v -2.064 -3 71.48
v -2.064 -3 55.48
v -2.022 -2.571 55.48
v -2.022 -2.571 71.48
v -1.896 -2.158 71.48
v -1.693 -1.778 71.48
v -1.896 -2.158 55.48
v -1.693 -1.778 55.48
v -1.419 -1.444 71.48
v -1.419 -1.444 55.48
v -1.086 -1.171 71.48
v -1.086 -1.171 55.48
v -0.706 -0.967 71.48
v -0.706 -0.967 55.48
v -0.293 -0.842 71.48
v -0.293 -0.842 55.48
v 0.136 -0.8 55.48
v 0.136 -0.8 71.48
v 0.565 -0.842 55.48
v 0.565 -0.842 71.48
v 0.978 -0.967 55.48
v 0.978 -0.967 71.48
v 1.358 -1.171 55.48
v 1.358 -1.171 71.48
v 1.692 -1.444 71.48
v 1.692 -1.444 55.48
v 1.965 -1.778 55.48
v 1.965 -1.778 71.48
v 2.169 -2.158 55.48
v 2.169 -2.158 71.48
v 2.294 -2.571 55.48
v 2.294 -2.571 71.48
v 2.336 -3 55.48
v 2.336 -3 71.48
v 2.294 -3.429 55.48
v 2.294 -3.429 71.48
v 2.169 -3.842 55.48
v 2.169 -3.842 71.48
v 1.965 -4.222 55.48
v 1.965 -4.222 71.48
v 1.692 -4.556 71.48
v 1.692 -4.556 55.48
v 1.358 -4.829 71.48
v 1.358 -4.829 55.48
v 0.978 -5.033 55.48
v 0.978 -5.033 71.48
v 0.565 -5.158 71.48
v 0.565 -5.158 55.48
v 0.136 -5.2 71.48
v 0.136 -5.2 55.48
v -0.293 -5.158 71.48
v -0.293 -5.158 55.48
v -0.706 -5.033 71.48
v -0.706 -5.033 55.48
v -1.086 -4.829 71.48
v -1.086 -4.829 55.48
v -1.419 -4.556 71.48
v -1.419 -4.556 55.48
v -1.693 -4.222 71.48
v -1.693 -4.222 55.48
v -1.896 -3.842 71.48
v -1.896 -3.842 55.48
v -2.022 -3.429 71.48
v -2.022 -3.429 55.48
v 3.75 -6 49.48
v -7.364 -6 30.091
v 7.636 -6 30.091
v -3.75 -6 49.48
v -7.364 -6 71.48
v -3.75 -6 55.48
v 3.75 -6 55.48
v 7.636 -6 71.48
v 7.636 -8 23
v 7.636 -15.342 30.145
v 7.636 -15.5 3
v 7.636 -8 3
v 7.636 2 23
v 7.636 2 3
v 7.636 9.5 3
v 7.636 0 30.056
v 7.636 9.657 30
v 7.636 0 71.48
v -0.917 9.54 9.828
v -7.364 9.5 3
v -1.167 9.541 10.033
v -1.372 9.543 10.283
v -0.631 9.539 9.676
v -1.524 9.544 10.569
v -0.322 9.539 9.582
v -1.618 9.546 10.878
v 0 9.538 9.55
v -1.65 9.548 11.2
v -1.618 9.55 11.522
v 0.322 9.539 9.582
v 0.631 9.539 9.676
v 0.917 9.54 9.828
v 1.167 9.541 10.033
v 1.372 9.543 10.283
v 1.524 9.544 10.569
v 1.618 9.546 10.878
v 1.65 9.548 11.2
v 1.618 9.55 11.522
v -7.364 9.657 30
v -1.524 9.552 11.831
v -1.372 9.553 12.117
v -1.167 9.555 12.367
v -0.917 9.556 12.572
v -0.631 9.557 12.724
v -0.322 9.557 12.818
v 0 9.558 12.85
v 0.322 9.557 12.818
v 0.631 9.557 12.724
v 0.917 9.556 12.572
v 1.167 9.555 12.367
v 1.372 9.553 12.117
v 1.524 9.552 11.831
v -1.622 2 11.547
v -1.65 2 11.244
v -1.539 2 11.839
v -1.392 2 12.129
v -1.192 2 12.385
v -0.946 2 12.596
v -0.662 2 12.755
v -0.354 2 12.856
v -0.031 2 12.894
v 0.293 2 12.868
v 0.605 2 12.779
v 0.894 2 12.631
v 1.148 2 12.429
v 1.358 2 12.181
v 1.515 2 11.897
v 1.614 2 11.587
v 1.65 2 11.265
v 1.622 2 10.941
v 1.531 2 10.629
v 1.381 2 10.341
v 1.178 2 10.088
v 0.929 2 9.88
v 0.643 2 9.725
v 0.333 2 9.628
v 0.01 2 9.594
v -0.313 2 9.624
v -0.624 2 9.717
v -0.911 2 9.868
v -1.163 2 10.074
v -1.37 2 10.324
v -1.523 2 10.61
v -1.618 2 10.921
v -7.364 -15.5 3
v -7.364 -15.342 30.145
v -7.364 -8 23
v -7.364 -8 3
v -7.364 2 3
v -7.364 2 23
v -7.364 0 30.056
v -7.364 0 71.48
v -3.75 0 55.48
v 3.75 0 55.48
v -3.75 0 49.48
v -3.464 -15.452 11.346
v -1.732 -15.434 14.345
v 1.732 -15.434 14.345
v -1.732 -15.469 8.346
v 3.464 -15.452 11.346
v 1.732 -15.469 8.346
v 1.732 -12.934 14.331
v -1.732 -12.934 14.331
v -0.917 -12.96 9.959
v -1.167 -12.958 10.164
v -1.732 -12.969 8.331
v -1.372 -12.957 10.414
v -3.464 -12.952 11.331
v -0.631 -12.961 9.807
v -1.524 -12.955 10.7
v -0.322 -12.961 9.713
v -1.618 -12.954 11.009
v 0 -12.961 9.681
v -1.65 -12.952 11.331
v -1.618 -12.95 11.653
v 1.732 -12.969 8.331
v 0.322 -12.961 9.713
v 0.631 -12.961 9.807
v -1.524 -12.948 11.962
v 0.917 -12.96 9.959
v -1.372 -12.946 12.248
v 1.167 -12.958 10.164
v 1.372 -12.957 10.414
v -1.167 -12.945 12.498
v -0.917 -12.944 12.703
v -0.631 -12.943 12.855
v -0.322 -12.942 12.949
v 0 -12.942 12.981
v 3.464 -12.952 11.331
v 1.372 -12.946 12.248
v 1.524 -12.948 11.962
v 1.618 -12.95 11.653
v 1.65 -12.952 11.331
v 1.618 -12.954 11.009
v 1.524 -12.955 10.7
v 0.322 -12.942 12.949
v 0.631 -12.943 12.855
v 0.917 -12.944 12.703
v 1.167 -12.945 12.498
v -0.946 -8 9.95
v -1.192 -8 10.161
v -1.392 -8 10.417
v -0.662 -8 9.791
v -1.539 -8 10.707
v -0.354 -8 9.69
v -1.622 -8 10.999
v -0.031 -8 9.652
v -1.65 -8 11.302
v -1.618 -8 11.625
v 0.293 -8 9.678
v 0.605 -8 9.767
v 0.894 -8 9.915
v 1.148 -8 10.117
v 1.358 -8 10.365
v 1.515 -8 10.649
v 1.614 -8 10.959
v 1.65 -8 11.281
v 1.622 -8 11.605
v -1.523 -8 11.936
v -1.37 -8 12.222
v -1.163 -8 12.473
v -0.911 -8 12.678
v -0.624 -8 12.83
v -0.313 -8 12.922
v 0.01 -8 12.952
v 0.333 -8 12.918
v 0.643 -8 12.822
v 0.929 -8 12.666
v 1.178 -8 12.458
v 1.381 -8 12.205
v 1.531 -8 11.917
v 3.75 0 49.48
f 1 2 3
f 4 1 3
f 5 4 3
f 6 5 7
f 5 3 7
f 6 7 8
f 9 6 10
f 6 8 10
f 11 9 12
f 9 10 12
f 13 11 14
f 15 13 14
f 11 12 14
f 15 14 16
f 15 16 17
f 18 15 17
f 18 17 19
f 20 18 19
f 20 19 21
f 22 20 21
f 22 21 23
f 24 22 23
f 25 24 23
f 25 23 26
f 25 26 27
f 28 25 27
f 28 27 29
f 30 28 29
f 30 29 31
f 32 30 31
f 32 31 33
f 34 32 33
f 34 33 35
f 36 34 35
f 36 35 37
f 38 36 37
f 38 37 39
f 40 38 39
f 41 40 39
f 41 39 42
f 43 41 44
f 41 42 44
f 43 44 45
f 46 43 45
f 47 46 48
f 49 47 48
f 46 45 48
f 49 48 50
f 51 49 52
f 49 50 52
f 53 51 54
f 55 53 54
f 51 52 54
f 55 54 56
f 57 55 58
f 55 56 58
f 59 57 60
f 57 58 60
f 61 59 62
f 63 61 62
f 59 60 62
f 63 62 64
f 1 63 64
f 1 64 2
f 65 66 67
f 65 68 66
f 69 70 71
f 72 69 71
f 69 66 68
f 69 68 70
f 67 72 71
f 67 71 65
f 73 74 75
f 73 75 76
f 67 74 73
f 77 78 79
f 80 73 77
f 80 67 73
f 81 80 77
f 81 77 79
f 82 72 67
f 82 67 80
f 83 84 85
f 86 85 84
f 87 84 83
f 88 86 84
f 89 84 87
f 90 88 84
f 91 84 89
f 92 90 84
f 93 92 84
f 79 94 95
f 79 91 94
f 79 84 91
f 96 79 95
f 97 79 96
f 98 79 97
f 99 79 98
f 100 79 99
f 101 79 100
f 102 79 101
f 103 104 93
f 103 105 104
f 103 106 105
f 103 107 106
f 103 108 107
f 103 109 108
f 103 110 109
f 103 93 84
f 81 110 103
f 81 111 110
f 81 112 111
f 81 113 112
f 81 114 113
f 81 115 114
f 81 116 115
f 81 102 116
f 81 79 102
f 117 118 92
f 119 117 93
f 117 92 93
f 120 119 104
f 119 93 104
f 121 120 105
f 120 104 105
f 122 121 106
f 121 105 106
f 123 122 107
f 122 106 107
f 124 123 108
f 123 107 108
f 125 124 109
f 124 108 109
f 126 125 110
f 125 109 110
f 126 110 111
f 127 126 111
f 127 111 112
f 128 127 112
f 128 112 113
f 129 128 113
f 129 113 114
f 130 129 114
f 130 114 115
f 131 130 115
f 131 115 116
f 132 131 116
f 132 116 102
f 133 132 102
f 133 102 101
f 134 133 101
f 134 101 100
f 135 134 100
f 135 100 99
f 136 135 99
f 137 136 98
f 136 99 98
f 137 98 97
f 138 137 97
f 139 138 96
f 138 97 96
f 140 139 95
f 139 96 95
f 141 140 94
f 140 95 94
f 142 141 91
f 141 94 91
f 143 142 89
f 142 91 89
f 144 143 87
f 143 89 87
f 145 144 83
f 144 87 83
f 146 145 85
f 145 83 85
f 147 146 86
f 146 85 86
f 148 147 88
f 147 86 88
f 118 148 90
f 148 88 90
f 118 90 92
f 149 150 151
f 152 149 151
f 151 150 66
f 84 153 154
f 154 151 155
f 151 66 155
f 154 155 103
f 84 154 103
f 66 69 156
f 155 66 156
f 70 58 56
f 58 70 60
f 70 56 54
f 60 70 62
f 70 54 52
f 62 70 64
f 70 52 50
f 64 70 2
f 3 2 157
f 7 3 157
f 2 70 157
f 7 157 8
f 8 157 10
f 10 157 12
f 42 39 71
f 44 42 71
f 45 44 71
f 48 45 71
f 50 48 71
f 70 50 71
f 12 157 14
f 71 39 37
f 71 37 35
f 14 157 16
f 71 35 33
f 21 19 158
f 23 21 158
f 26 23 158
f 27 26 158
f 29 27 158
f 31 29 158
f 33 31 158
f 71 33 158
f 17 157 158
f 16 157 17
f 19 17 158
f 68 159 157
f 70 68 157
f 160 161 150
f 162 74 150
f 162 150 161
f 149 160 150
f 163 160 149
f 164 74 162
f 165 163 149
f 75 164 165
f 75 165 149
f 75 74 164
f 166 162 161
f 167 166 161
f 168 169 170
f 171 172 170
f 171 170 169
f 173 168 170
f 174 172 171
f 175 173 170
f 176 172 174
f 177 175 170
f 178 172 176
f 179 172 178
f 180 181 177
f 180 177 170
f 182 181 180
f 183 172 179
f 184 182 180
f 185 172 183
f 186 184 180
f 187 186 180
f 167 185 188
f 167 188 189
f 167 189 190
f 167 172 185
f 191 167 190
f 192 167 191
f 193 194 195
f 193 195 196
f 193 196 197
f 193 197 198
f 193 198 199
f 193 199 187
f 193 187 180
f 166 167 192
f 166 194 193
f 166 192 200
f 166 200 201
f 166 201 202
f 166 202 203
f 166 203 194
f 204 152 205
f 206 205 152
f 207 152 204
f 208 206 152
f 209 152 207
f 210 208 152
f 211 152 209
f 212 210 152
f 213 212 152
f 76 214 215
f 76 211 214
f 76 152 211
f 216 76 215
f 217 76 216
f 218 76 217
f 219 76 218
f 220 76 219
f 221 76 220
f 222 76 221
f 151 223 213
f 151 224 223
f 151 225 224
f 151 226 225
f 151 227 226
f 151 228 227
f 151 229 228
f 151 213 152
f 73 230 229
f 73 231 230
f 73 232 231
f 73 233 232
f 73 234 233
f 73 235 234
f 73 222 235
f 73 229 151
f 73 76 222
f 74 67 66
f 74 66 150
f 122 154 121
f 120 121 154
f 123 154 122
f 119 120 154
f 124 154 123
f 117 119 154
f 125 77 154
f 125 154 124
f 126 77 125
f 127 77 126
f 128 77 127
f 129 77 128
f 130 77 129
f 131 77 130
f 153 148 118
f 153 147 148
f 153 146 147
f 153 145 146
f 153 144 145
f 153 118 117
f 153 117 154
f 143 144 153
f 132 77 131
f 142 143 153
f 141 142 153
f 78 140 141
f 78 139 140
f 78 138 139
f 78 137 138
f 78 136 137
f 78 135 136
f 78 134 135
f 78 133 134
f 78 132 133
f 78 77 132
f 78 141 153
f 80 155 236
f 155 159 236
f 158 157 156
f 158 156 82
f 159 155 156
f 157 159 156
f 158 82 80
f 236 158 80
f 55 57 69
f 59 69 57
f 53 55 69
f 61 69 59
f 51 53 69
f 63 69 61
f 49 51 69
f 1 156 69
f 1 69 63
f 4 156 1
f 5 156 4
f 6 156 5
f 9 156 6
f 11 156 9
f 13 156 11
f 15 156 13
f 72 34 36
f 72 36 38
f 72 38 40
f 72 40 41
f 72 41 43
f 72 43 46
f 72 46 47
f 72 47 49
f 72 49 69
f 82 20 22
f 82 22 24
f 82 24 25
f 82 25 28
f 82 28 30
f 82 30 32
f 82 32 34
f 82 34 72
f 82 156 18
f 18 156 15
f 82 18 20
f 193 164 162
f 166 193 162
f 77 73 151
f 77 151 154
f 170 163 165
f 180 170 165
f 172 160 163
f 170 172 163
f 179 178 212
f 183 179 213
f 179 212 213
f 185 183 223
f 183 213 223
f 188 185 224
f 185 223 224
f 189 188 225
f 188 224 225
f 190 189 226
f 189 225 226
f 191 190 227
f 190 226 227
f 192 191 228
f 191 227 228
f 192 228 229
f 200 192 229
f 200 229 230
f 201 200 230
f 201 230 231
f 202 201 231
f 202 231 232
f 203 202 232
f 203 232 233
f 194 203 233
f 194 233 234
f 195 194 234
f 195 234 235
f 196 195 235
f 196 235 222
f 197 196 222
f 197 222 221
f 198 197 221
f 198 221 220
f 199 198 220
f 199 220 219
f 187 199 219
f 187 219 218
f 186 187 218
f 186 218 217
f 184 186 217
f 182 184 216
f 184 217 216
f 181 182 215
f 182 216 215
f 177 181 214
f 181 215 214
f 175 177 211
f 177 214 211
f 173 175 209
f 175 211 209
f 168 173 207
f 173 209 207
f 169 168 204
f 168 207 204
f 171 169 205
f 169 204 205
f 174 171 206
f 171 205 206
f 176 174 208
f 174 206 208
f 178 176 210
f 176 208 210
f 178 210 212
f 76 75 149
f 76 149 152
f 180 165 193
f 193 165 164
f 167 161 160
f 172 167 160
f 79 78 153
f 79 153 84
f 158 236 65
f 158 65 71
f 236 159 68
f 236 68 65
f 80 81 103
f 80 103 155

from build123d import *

# Parameters (mm, degrees)
F0_W     = 15
F0_H     = 43.4799888134
F0_W_2   = 7.5
F0_H_2   = 6
F1_DEPTH = 6
F3_DEPTH = 15
F5_D     = 4.4
F5_DEPTH = 20
F5_TIP   = 1.3218933619
F7_D     = 3.3
F7_DEPTH = 40
F7_TIP   = 0.9914200214
F8_DEPTH = 2.5


with BuildPart() as f1:
    # F0 (on Front) → F1 (new body)
    with BuildSketch(Plane.XZ):
        with Locations((0.1361690943, 49.7399944067)):
            Rectangle(F0_W, F0_H)
        with Locations((0, 52.4799888134)):
            Rectangle(F0_W_2, F0_H_2, mode=Mode.SUBTRACT)
    extrude(amount=F1_DEPTH)

    # F2 (on face) → F3 (join)
    with BuildSketch(Plane.YZ.offset(7.6361690943)):
        Polygon((9.5002116757, 3), (9.6573423812, 30), (0, 30.0562024082), (0, 28), (-6, 28), (-6, 30.0911203428), (-15.3422342746, 30.1454889303), (-15.5002116757, 3), (-8, 3), (-8, 23), (2, 23), (2, 3), align=None)
    extrude(amount=-F3_DEPTH)

    # F5
    with Locations(Plane.XY.offset(71.4799888134)):
        with Locations((0.1361690943, -3)):
            Hole(F5_D / 2, depth=F5_DEPTH)
            with Locations((0, 0, -(F5_DEPTH + F5_TIP / 2))):  # 118° drill point
                Cone(0, F5_D / 2, F5_TIP, mode=Mode.SUBTRACT)

    # F7
    with Locations(Plane(origin=(0, -15.5171451022, 0.0903044429), x_dir=(1, 0, 0), z_dir=(0, -0.9999830662, 0.0058195572))):
        with Locations((0, 11.2554198566)):
            Hole(F7_D / 2, depth=F7_DEPTH)
            with Locations((0, 0, -(F7_DEPTH + F7_TIP / 2))):  # 118° drill point
                Cone(0, F7_D / 2, F7_TIP, mode=Mode.SUBTRACT)

    # F6 (on face) → F8 (cut)
    with BuildSketch(Plane(origin=(0, -15.5171451022, 0.0903044429), x_dir=(1, 0, 0), z_dir=(0, -0.9999830662, 0.0058195572))):
        Polygon((1.7320508076, 14.2554198566), (-1.7320508076, 14.2554198566), (-3.4641016151, 11.2554198566), (-1.7320508076, 8.2554198566), (1.7320508076, 8.2554198566), (3.4641016151, 11.2554198566), align=None)
    extrude(amount=-F8_DEPTH, mode=Mode.SUBTRACT)


solid = f1.part
